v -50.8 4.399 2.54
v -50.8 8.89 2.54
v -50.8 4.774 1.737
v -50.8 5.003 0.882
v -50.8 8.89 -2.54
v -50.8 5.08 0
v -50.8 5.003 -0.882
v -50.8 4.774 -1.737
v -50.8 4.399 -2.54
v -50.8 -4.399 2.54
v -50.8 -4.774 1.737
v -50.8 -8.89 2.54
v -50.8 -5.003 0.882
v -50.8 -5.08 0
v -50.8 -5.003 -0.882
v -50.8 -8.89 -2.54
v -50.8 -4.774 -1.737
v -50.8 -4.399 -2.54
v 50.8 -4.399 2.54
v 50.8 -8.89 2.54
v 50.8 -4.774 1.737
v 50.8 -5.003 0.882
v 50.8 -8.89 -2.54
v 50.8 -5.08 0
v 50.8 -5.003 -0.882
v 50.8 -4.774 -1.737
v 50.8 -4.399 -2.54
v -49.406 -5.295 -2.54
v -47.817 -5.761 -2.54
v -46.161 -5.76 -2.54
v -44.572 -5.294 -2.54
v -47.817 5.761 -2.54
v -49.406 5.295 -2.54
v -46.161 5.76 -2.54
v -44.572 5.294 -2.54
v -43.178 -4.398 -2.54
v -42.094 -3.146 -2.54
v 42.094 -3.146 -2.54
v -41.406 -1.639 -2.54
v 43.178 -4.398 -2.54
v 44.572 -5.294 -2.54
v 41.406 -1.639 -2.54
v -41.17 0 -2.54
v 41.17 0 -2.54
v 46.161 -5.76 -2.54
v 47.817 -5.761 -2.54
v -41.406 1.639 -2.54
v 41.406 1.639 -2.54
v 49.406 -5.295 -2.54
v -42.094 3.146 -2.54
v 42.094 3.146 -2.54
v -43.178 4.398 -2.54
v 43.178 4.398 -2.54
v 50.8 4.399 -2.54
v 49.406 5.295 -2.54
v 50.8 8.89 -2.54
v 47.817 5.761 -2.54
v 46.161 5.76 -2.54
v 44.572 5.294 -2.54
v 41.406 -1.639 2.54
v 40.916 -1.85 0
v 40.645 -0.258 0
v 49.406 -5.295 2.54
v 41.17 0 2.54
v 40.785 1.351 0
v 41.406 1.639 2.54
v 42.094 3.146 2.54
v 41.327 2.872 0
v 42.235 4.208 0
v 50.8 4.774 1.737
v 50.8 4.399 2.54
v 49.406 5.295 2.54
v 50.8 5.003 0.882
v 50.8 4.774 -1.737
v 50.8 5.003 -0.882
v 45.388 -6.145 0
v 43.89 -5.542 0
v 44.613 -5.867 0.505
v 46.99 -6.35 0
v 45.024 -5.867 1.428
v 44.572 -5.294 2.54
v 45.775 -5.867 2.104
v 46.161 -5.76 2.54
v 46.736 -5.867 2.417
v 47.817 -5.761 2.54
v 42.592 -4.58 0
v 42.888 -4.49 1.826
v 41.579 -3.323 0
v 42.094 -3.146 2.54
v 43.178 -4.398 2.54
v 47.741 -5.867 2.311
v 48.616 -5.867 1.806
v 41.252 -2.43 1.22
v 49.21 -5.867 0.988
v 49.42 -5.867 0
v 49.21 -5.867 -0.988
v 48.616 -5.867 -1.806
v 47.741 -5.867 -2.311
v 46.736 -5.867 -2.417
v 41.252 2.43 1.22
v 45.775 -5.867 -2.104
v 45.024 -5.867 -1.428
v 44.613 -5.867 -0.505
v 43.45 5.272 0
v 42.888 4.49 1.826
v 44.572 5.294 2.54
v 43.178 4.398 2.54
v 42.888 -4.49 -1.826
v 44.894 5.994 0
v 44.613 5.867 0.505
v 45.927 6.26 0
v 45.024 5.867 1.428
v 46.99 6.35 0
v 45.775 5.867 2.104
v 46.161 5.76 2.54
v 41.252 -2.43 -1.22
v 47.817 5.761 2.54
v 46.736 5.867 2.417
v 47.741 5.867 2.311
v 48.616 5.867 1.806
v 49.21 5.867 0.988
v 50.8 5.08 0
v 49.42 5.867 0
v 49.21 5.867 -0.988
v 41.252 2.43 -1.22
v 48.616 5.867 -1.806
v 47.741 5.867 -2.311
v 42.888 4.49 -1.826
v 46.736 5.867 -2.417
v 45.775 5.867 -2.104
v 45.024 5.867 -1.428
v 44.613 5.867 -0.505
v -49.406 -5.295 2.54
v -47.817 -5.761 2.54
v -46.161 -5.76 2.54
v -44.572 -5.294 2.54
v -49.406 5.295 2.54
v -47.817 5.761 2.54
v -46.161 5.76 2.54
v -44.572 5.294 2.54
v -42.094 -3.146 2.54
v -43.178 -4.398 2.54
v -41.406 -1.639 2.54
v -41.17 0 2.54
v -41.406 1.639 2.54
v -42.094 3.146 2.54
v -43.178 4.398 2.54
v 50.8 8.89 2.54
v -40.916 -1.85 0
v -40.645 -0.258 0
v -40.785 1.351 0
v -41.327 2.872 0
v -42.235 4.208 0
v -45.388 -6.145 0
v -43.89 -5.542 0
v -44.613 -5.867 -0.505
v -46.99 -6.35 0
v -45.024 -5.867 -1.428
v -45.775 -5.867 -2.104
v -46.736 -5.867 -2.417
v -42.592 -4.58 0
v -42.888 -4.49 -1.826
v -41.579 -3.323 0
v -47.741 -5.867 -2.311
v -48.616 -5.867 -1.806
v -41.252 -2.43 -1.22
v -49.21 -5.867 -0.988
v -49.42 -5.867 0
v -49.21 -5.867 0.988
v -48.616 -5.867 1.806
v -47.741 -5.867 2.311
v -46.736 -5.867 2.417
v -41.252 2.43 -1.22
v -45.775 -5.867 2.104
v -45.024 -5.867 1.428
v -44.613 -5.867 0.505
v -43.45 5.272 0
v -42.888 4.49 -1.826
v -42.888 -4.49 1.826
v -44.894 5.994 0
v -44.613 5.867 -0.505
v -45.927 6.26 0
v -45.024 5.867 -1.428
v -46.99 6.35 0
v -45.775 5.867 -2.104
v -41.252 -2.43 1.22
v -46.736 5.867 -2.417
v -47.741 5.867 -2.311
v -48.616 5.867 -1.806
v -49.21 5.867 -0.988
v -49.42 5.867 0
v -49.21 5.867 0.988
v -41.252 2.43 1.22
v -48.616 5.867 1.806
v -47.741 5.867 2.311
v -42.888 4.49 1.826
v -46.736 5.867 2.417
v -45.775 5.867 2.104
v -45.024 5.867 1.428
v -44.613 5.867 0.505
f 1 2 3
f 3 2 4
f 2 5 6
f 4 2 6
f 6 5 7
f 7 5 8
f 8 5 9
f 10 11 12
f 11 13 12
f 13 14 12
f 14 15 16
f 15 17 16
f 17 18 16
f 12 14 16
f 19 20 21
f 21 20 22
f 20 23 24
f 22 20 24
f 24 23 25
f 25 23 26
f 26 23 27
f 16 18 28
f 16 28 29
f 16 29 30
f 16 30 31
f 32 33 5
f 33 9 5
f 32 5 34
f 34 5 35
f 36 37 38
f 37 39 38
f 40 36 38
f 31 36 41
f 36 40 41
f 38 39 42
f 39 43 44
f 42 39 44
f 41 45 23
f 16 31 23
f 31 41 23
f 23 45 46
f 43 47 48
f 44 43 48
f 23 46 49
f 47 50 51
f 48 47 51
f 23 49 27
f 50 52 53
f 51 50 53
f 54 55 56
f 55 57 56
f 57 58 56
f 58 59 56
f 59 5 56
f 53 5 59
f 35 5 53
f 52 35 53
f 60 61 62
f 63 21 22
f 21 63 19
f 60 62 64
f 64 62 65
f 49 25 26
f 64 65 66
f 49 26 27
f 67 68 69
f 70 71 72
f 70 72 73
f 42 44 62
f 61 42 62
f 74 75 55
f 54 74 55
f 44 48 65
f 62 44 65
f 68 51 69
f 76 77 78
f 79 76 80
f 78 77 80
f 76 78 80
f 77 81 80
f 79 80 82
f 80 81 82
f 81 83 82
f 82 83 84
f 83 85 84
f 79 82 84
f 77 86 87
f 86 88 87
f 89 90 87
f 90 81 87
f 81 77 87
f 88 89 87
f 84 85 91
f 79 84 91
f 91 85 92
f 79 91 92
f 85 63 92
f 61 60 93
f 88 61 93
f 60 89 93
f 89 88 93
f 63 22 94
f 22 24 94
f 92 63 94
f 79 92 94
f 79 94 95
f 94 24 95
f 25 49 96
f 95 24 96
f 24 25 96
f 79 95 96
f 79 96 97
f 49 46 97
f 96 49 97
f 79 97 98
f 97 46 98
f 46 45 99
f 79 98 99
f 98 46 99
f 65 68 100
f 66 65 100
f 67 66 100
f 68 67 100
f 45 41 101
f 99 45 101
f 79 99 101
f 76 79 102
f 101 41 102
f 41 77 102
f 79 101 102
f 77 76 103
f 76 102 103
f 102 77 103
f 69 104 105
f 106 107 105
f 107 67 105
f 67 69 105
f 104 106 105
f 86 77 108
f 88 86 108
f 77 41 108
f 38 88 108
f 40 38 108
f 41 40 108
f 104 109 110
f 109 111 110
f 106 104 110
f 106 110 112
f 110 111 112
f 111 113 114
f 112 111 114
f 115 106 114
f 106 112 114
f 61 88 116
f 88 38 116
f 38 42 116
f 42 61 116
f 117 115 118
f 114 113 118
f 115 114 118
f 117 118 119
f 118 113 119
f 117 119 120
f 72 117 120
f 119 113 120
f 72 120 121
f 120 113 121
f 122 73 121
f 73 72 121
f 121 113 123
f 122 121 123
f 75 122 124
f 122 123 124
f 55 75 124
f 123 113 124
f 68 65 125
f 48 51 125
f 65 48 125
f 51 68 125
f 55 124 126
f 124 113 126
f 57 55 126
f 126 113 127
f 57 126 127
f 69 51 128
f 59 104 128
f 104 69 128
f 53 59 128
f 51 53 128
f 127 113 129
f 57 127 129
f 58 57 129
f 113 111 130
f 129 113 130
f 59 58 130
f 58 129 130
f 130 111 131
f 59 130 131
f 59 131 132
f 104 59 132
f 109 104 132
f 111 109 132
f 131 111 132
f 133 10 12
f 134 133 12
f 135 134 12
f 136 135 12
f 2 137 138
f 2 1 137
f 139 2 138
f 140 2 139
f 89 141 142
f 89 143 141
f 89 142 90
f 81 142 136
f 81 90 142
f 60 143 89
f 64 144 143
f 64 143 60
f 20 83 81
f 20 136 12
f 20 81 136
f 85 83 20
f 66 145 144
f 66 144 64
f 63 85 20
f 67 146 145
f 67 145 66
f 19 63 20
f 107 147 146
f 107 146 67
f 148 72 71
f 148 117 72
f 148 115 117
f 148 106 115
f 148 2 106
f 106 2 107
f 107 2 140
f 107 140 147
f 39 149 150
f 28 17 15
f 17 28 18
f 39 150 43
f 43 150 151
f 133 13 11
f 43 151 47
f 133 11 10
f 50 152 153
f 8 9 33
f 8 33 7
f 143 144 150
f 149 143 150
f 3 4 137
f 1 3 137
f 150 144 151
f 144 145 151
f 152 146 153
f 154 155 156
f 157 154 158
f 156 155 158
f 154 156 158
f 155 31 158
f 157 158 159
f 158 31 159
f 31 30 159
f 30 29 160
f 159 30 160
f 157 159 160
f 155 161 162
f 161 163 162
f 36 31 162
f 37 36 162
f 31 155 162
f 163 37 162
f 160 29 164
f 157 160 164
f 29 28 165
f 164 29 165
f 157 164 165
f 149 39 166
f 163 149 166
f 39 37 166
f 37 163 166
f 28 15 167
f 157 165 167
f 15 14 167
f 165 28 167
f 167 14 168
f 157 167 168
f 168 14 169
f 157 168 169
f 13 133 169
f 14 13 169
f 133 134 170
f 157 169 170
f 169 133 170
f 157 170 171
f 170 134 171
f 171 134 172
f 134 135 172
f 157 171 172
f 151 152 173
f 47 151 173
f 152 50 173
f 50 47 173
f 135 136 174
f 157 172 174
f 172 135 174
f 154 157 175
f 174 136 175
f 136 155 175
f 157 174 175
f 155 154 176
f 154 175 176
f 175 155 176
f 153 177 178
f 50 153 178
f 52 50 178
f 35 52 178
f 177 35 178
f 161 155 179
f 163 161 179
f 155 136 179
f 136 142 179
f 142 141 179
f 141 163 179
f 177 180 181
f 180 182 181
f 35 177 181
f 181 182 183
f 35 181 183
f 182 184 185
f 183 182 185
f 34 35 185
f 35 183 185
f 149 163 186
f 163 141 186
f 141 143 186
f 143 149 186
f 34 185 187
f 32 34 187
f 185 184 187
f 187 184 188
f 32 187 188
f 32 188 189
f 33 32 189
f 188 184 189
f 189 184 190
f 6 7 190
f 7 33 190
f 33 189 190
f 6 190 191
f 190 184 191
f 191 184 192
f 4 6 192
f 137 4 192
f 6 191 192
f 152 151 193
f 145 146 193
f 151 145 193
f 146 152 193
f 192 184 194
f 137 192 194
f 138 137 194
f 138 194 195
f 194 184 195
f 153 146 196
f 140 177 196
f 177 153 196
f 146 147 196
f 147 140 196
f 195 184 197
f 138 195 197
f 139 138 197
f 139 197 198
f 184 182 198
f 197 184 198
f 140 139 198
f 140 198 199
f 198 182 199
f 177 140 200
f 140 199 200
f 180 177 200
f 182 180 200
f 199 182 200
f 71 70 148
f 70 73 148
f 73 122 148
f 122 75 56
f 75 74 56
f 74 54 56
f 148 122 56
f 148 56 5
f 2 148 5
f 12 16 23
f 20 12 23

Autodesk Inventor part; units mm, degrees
ref_plane "YZ Plane" through (0, 0, 0) normal (1, 0, 0) x (0, 1, 0)
ref_plane "XZ Plane" through (0, 0, 0) normal (0, 1, 0) x (-1, 0, 0)
ref_plane "XY Plane" through (0, 0, 0) normal (0, 0, 1) x (1, 0, 0)
sketch "Sketch1" plane through (0, 0, 0) normal (0, 0, 1) x (1, 0, 0)
  line L0 (-50.8, -8.89) -> (50.8, -8.89)
  line L1 (50.8, -8.89) -> (50.8, 8.89)
  line L2 (50.8, 8.89) -> (-50.8, 8.89)
  line L3 (-50.8, 8.89) -> (-50.8, -8.89)
  line L4 (-50.8, -8.89) -> (50.8, 8.89) construction
  line L5 (50.8, -8.89) -> (-50.8, 8.89) construction
  point P0 (0, 0)
  dimension "d18" = 17.78
  dimension "d19" = 101.6
extrude "Extrusion1" add sketch "Sketch1" along normal mid plane 5.08
sketch "Sketch4" plane through (0, 0, 0) normal (0, 0, 1) x (1, 0, 0)
  line L0 (-50.8, -8.89) -> (-50.8, 8.89) construction
  line L1 (-50.8, 8.89) -> (50.8, 8.89) construction
  line L2 (50.8, 8.89) -> (50.8, -8.89) construction
  line L3 (50.8, -8.89) -> (-50.8, -8.89) construction
  arc A0 (46.99, -6.35) -> (46.99, 6.35) centre (46.99, 0) ccw
  line L4 (46.99, 6.35) -> (46.99, -6.35)
  point P0 (0, 0)
  point P1 (50.8, 0)
  dimension "d20" = 6.35
  dimension "d21" = 3.81
revolve "Revolution2" cut sketch "Sketch4" angle 360 about axis through (46.99, 6.35, 0) along (0, -1, 0)
mirror "Mirror1" about plane through (0, 0, 0) normal (1, 0, 0) of "Revolution2"
properties part number "deltabot arm"
